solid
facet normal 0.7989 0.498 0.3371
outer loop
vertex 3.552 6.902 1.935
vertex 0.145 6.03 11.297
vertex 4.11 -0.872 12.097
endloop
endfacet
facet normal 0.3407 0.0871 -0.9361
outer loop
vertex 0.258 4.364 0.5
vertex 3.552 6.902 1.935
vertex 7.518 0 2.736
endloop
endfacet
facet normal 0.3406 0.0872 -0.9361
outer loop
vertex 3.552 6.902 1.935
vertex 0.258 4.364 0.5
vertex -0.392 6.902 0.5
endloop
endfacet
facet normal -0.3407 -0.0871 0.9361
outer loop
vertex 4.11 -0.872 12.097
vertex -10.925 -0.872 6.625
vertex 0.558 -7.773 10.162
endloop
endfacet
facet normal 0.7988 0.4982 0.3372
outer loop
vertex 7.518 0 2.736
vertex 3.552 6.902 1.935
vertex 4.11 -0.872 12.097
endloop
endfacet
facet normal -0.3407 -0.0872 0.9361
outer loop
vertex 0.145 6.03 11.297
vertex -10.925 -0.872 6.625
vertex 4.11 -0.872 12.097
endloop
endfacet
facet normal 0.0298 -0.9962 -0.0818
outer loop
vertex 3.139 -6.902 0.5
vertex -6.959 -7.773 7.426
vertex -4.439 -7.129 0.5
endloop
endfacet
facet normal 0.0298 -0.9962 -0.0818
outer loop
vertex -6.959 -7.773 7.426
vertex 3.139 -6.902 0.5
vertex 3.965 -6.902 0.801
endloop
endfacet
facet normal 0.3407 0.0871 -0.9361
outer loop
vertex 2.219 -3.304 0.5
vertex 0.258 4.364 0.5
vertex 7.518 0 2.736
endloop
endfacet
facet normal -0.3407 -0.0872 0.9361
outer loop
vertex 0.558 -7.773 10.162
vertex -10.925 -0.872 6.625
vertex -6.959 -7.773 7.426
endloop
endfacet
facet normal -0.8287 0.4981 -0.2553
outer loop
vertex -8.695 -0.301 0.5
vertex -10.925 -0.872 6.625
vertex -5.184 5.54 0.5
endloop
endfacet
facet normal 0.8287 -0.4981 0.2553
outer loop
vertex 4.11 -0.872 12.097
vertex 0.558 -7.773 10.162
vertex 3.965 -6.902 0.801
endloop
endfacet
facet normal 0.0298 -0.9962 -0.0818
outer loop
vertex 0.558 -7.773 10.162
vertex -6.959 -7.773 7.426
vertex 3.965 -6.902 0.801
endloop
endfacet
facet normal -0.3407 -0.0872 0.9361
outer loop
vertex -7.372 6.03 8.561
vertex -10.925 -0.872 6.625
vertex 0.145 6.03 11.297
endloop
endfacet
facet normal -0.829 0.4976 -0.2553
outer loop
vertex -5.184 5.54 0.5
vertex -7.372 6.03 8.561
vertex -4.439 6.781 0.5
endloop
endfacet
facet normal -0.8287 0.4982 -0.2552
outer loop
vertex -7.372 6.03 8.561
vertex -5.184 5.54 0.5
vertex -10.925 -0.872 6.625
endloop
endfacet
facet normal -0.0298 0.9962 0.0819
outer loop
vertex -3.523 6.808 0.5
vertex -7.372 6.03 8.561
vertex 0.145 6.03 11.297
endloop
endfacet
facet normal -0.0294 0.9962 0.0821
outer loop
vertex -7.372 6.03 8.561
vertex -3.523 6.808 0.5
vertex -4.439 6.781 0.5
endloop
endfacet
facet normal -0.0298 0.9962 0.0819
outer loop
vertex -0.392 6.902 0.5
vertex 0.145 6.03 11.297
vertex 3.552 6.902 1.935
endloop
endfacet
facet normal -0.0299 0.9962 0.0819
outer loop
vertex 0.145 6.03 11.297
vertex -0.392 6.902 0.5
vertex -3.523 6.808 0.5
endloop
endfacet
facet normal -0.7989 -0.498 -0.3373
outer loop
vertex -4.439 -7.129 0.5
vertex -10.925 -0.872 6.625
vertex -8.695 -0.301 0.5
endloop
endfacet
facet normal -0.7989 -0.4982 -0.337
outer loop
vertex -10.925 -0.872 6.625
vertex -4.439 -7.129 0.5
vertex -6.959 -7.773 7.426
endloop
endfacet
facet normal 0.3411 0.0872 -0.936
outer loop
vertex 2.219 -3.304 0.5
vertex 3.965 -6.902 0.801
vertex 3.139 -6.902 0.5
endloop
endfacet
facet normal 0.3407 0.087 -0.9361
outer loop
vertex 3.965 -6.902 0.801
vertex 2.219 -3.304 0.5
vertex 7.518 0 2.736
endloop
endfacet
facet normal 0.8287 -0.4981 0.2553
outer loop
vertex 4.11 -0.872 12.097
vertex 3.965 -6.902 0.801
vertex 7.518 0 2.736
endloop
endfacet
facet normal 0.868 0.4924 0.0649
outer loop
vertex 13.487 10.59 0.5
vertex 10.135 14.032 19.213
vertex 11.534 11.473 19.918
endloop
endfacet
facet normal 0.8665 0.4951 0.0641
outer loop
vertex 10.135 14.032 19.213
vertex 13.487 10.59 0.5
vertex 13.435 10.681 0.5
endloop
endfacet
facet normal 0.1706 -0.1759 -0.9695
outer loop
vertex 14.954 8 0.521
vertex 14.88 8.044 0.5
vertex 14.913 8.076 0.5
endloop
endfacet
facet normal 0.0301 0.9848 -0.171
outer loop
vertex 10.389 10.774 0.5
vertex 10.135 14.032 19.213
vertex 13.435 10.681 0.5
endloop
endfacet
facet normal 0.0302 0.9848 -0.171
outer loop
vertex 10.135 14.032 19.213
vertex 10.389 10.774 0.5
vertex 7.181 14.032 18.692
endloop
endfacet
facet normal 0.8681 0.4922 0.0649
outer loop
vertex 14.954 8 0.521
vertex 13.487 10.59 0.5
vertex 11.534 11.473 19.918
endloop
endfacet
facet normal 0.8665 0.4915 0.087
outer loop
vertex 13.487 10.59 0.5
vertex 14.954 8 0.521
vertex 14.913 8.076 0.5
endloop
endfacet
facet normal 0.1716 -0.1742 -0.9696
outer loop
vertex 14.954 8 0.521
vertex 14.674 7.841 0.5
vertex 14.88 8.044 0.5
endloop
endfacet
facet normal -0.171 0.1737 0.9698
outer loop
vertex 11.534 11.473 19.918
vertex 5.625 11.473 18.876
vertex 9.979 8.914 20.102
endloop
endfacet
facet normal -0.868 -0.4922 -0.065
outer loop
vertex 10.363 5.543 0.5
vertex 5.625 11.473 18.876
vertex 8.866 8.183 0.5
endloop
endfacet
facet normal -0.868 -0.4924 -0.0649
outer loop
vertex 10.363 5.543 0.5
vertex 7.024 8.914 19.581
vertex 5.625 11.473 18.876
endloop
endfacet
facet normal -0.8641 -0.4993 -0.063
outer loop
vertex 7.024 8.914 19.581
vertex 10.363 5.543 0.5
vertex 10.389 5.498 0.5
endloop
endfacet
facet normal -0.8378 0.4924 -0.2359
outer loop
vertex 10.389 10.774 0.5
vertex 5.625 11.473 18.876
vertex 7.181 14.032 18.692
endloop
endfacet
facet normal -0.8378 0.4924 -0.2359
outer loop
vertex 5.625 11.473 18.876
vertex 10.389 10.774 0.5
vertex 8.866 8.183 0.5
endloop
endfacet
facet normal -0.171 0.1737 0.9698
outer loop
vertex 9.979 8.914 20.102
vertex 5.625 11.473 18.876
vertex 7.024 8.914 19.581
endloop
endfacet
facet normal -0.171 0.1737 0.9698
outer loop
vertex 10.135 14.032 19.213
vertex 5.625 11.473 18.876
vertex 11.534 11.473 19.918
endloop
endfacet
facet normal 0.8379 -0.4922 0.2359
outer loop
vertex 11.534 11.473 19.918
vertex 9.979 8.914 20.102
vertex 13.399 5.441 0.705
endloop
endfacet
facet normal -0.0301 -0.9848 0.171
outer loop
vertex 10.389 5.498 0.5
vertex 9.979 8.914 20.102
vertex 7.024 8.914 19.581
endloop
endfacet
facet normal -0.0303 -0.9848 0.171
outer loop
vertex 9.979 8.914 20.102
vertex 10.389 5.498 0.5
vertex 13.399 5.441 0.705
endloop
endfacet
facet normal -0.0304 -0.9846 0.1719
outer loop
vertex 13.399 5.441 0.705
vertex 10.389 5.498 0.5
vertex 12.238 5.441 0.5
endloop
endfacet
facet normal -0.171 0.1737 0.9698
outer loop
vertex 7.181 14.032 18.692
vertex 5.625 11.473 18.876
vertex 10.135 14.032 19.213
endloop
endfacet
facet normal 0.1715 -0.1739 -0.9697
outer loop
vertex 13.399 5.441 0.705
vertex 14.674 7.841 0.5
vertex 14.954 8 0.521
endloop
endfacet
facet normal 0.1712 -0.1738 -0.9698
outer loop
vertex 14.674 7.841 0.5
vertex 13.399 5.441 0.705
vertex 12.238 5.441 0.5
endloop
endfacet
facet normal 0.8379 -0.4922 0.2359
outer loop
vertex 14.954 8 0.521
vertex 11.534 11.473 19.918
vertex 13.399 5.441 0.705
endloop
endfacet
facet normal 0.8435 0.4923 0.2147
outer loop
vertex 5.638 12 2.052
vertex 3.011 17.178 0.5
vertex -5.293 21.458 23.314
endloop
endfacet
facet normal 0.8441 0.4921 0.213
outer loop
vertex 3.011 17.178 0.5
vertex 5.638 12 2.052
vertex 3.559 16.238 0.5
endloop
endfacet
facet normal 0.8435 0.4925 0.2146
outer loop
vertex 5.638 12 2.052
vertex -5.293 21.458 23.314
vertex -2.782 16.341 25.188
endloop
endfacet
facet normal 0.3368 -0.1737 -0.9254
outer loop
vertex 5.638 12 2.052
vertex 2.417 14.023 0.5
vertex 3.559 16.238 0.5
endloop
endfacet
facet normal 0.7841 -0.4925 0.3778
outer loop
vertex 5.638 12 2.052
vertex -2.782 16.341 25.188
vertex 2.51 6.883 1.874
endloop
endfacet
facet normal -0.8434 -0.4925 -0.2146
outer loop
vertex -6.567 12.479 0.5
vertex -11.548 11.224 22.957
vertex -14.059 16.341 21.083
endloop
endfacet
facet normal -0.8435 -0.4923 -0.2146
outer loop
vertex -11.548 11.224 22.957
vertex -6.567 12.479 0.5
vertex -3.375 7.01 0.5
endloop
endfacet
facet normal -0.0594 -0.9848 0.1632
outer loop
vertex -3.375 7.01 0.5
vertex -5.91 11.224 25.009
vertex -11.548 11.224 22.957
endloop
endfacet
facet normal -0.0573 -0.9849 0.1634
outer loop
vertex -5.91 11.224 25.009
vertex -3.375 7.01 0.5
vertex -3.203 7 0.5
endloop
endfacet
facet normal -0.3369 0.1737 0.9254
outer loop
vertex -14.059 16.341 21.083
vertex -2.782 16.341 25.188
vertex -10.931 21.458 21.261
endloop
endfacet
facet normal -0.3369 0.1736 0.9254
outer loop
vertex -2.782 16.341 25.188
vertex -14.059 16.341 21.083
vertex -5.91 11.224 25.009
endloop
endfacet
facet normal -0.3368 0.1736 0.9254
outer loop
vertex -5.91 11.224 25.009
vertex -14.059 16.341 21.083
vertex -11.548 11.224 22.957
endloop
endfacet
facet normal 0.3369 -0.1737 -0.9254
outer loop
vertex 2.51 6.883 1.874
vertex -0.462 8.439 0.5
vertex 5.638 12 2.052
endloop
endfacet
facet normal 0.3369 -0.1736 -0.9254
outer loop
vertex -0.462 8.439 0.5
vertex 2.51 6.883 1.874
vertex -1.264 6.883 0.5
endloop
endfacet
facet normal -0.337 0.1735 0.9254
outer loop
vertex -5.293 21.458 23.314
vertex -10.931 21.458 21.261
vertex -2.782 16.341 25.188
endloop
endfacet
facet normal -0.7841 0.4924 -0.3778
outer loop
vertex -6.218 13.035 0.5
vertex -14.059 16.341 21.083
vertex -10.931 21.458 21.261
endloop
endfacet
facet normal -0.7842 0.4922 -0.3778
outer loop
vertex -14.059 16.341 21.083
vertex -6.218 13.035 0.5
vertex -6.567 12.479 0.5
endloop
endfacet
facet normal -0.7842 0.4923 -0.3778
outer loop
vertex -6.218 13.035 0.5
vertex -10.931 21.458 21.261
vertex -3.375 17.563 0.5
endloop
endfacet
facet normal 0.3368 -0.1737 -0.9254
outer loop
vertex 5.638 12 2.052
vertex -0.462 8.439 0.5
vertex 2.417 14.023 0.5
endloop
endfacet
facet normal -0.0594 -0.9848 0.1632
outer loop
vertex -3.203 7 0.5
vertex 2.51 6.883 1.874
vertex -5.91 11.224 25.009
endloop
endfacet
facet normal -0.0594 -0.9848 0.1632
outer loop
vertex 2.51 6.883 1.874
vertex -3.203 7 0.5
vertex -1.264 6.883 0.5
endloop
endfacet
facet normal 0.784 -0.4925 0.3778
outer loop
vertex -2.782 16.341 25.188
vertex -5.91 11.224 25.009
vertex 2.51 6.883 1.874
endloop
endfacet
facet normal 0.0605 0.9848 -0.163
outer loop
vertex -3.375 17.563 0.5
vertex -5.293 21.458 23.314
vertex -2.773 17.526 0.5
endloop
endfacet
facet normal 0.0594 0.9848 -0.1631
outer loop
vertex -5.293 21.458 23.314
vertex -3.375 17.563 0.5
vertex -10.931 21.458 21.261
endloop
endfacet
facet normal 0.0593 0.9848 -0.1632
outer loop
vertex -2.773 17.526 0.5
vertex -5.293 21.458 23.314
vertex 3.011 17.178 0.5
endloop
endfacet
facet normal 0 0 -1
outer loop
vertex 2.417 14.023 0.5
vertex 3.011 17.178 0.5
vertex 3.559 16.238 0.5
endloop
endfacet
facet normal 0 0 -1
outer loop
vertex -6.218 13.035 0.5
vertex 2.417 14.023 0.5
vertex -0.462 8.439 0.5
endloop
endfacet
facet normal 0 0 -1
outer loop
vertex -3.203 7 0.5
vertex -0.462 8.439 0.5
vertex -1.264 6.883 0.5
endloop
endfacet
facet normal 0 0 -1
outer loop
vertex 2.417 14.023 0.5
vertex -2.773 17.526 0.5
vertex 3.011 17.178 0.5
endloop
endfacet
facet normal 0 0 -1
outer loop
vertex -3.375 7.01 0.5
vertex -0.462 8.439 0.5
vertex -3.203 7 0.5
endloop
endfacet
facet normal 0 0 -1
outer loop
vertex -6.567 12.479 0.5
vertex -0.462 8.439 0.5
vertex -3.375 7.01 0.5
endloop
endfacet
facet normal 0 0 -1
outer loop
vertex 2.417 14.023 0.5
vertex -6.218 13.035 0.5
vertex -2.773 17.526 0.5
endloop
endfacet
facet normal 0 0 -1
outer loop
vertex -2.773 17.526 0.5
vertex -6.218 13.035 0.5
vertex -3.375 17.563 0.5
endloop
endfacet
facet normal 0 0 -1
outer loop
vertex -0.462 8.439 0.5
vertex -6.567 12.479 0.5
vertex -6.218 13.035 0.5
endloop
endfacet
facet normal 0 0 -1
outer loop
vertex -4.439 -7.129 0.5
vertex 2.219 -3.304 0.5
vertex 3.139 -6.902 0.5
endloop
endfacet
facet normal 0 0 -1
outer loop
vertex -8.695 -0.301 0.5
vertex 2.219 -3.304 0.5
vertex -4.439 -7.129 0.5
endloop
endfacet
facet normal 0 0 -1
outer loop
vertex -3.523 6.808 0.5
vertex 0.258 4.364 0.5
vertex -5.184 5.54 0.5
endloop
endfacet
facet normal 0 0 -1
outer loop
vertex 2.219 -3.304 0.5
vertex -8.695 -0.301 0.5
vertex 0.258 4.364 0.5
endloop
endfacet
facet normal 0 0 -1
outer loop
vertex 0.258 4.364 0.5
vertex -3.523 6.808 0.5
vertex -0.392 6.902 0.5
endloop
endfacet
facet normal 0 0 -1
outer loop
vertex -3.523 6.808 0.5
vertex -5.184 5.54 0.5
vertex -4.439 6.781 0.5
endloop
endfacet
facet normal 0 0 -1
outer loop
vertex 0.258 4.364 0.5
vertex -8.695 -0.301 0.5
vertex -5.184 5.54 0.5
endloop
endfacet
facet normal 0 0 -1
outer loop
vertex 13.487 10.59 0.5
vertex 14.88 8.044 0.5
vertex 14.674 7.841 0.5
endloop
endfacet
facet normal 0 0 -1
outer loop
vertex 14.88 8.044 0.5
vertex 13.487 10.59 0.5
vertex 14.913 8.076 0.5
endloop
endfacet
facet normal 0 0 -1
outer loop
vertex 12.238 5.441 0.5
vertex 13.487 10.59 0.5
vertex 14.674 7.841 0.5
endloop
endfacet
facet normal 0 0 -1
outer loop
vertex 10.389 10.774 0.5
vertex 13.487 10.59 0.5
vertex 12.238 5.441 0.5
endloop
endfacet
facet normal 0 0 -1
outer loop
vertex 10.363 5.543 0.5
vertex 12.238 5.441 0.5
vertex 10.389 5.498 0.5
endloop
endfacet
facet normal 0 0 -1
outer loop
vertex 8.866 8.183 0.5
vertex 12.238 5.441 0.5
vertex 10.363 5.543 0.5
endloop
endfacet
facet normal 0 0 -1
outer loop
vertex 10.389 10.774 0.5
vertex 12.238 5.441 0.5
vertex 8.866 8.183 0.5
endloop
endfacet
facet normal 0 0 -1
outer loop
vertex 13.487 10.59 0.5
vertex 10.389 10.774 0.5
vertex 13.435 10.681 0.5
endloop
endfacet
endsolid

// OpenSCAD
crystal1_h=40;
crystal1_r=8;
crystal1_facets=6;
crystal1_angles=[-30,0,0];

crystal2_h=30;
crystal2_r=6;
crystal2_facets=6;
crystal2_angles=[20,0,0];

crystal3_h=20;
crystal3_r=3;
crystal3_facets=6;
crystal3_angles=[20,0,0];

crystal4_h=10;
crystal4_r=8;
crystal4_facets=6;
crystal4_angles=[5,-20,0];

crystal5_h=20;
crystal5_r=3;
crystal5_facets=6;
crystal5_angles=[-10,-10,0];

crystal6_h=25;
crystal6_r=6;
crystal6_facets=6;
crystal6_angles=[-10,-20,0];



difference()
	{
		difference()
//		union()
	{
	color("blue")
	union()
		{
		translate([0,0,-5])
			rotate(crystal1_angles)
				cylinder(h=crystal1_h, r=crystal1_r,$fn=crystal1_facets);
		translate([crystal2_r/2,2*crystal2_r,0])	
			rotate(crystal2_angles)
				cylinder(h=crystal2_h, r=crystal2_r,$fn=crystal2_facets);
		translate([crystal1_r,crystal3_r,0])
			rotate(crystal3_angles)
				cylinder(h=crystal3_h, r=crystal3_r,$fn=crystal3_facets);		
		}
	!color("black")
	difference()
		{
		union()
			{
				translate([0,0,0	])
					rotate(crystal4_angles)
						cylinder(h=crystal4_h, r=crystal4_r,$fn=crystal4_facets);
				translate([crystal1_r*1.5,crystal1_r,0])
					rotate(crystal5_angles)
						cylinder(h=crystal5_h, r=crystal5_r,$fn=crystal5_facets);	
				translate([0*crystal1_r,2*crystal6_r,0])
					rotate(crystal6_angles)
						cylinder(h=crystal6_h, r=crystal6_r,$fn=crystal6_facets);	
			}
		translate([0,0,-7])
			cube([50,50,15], center=true);
		}
	}
	translate([0,0,-7])
		cube([50,50,15], center=true);
	}
